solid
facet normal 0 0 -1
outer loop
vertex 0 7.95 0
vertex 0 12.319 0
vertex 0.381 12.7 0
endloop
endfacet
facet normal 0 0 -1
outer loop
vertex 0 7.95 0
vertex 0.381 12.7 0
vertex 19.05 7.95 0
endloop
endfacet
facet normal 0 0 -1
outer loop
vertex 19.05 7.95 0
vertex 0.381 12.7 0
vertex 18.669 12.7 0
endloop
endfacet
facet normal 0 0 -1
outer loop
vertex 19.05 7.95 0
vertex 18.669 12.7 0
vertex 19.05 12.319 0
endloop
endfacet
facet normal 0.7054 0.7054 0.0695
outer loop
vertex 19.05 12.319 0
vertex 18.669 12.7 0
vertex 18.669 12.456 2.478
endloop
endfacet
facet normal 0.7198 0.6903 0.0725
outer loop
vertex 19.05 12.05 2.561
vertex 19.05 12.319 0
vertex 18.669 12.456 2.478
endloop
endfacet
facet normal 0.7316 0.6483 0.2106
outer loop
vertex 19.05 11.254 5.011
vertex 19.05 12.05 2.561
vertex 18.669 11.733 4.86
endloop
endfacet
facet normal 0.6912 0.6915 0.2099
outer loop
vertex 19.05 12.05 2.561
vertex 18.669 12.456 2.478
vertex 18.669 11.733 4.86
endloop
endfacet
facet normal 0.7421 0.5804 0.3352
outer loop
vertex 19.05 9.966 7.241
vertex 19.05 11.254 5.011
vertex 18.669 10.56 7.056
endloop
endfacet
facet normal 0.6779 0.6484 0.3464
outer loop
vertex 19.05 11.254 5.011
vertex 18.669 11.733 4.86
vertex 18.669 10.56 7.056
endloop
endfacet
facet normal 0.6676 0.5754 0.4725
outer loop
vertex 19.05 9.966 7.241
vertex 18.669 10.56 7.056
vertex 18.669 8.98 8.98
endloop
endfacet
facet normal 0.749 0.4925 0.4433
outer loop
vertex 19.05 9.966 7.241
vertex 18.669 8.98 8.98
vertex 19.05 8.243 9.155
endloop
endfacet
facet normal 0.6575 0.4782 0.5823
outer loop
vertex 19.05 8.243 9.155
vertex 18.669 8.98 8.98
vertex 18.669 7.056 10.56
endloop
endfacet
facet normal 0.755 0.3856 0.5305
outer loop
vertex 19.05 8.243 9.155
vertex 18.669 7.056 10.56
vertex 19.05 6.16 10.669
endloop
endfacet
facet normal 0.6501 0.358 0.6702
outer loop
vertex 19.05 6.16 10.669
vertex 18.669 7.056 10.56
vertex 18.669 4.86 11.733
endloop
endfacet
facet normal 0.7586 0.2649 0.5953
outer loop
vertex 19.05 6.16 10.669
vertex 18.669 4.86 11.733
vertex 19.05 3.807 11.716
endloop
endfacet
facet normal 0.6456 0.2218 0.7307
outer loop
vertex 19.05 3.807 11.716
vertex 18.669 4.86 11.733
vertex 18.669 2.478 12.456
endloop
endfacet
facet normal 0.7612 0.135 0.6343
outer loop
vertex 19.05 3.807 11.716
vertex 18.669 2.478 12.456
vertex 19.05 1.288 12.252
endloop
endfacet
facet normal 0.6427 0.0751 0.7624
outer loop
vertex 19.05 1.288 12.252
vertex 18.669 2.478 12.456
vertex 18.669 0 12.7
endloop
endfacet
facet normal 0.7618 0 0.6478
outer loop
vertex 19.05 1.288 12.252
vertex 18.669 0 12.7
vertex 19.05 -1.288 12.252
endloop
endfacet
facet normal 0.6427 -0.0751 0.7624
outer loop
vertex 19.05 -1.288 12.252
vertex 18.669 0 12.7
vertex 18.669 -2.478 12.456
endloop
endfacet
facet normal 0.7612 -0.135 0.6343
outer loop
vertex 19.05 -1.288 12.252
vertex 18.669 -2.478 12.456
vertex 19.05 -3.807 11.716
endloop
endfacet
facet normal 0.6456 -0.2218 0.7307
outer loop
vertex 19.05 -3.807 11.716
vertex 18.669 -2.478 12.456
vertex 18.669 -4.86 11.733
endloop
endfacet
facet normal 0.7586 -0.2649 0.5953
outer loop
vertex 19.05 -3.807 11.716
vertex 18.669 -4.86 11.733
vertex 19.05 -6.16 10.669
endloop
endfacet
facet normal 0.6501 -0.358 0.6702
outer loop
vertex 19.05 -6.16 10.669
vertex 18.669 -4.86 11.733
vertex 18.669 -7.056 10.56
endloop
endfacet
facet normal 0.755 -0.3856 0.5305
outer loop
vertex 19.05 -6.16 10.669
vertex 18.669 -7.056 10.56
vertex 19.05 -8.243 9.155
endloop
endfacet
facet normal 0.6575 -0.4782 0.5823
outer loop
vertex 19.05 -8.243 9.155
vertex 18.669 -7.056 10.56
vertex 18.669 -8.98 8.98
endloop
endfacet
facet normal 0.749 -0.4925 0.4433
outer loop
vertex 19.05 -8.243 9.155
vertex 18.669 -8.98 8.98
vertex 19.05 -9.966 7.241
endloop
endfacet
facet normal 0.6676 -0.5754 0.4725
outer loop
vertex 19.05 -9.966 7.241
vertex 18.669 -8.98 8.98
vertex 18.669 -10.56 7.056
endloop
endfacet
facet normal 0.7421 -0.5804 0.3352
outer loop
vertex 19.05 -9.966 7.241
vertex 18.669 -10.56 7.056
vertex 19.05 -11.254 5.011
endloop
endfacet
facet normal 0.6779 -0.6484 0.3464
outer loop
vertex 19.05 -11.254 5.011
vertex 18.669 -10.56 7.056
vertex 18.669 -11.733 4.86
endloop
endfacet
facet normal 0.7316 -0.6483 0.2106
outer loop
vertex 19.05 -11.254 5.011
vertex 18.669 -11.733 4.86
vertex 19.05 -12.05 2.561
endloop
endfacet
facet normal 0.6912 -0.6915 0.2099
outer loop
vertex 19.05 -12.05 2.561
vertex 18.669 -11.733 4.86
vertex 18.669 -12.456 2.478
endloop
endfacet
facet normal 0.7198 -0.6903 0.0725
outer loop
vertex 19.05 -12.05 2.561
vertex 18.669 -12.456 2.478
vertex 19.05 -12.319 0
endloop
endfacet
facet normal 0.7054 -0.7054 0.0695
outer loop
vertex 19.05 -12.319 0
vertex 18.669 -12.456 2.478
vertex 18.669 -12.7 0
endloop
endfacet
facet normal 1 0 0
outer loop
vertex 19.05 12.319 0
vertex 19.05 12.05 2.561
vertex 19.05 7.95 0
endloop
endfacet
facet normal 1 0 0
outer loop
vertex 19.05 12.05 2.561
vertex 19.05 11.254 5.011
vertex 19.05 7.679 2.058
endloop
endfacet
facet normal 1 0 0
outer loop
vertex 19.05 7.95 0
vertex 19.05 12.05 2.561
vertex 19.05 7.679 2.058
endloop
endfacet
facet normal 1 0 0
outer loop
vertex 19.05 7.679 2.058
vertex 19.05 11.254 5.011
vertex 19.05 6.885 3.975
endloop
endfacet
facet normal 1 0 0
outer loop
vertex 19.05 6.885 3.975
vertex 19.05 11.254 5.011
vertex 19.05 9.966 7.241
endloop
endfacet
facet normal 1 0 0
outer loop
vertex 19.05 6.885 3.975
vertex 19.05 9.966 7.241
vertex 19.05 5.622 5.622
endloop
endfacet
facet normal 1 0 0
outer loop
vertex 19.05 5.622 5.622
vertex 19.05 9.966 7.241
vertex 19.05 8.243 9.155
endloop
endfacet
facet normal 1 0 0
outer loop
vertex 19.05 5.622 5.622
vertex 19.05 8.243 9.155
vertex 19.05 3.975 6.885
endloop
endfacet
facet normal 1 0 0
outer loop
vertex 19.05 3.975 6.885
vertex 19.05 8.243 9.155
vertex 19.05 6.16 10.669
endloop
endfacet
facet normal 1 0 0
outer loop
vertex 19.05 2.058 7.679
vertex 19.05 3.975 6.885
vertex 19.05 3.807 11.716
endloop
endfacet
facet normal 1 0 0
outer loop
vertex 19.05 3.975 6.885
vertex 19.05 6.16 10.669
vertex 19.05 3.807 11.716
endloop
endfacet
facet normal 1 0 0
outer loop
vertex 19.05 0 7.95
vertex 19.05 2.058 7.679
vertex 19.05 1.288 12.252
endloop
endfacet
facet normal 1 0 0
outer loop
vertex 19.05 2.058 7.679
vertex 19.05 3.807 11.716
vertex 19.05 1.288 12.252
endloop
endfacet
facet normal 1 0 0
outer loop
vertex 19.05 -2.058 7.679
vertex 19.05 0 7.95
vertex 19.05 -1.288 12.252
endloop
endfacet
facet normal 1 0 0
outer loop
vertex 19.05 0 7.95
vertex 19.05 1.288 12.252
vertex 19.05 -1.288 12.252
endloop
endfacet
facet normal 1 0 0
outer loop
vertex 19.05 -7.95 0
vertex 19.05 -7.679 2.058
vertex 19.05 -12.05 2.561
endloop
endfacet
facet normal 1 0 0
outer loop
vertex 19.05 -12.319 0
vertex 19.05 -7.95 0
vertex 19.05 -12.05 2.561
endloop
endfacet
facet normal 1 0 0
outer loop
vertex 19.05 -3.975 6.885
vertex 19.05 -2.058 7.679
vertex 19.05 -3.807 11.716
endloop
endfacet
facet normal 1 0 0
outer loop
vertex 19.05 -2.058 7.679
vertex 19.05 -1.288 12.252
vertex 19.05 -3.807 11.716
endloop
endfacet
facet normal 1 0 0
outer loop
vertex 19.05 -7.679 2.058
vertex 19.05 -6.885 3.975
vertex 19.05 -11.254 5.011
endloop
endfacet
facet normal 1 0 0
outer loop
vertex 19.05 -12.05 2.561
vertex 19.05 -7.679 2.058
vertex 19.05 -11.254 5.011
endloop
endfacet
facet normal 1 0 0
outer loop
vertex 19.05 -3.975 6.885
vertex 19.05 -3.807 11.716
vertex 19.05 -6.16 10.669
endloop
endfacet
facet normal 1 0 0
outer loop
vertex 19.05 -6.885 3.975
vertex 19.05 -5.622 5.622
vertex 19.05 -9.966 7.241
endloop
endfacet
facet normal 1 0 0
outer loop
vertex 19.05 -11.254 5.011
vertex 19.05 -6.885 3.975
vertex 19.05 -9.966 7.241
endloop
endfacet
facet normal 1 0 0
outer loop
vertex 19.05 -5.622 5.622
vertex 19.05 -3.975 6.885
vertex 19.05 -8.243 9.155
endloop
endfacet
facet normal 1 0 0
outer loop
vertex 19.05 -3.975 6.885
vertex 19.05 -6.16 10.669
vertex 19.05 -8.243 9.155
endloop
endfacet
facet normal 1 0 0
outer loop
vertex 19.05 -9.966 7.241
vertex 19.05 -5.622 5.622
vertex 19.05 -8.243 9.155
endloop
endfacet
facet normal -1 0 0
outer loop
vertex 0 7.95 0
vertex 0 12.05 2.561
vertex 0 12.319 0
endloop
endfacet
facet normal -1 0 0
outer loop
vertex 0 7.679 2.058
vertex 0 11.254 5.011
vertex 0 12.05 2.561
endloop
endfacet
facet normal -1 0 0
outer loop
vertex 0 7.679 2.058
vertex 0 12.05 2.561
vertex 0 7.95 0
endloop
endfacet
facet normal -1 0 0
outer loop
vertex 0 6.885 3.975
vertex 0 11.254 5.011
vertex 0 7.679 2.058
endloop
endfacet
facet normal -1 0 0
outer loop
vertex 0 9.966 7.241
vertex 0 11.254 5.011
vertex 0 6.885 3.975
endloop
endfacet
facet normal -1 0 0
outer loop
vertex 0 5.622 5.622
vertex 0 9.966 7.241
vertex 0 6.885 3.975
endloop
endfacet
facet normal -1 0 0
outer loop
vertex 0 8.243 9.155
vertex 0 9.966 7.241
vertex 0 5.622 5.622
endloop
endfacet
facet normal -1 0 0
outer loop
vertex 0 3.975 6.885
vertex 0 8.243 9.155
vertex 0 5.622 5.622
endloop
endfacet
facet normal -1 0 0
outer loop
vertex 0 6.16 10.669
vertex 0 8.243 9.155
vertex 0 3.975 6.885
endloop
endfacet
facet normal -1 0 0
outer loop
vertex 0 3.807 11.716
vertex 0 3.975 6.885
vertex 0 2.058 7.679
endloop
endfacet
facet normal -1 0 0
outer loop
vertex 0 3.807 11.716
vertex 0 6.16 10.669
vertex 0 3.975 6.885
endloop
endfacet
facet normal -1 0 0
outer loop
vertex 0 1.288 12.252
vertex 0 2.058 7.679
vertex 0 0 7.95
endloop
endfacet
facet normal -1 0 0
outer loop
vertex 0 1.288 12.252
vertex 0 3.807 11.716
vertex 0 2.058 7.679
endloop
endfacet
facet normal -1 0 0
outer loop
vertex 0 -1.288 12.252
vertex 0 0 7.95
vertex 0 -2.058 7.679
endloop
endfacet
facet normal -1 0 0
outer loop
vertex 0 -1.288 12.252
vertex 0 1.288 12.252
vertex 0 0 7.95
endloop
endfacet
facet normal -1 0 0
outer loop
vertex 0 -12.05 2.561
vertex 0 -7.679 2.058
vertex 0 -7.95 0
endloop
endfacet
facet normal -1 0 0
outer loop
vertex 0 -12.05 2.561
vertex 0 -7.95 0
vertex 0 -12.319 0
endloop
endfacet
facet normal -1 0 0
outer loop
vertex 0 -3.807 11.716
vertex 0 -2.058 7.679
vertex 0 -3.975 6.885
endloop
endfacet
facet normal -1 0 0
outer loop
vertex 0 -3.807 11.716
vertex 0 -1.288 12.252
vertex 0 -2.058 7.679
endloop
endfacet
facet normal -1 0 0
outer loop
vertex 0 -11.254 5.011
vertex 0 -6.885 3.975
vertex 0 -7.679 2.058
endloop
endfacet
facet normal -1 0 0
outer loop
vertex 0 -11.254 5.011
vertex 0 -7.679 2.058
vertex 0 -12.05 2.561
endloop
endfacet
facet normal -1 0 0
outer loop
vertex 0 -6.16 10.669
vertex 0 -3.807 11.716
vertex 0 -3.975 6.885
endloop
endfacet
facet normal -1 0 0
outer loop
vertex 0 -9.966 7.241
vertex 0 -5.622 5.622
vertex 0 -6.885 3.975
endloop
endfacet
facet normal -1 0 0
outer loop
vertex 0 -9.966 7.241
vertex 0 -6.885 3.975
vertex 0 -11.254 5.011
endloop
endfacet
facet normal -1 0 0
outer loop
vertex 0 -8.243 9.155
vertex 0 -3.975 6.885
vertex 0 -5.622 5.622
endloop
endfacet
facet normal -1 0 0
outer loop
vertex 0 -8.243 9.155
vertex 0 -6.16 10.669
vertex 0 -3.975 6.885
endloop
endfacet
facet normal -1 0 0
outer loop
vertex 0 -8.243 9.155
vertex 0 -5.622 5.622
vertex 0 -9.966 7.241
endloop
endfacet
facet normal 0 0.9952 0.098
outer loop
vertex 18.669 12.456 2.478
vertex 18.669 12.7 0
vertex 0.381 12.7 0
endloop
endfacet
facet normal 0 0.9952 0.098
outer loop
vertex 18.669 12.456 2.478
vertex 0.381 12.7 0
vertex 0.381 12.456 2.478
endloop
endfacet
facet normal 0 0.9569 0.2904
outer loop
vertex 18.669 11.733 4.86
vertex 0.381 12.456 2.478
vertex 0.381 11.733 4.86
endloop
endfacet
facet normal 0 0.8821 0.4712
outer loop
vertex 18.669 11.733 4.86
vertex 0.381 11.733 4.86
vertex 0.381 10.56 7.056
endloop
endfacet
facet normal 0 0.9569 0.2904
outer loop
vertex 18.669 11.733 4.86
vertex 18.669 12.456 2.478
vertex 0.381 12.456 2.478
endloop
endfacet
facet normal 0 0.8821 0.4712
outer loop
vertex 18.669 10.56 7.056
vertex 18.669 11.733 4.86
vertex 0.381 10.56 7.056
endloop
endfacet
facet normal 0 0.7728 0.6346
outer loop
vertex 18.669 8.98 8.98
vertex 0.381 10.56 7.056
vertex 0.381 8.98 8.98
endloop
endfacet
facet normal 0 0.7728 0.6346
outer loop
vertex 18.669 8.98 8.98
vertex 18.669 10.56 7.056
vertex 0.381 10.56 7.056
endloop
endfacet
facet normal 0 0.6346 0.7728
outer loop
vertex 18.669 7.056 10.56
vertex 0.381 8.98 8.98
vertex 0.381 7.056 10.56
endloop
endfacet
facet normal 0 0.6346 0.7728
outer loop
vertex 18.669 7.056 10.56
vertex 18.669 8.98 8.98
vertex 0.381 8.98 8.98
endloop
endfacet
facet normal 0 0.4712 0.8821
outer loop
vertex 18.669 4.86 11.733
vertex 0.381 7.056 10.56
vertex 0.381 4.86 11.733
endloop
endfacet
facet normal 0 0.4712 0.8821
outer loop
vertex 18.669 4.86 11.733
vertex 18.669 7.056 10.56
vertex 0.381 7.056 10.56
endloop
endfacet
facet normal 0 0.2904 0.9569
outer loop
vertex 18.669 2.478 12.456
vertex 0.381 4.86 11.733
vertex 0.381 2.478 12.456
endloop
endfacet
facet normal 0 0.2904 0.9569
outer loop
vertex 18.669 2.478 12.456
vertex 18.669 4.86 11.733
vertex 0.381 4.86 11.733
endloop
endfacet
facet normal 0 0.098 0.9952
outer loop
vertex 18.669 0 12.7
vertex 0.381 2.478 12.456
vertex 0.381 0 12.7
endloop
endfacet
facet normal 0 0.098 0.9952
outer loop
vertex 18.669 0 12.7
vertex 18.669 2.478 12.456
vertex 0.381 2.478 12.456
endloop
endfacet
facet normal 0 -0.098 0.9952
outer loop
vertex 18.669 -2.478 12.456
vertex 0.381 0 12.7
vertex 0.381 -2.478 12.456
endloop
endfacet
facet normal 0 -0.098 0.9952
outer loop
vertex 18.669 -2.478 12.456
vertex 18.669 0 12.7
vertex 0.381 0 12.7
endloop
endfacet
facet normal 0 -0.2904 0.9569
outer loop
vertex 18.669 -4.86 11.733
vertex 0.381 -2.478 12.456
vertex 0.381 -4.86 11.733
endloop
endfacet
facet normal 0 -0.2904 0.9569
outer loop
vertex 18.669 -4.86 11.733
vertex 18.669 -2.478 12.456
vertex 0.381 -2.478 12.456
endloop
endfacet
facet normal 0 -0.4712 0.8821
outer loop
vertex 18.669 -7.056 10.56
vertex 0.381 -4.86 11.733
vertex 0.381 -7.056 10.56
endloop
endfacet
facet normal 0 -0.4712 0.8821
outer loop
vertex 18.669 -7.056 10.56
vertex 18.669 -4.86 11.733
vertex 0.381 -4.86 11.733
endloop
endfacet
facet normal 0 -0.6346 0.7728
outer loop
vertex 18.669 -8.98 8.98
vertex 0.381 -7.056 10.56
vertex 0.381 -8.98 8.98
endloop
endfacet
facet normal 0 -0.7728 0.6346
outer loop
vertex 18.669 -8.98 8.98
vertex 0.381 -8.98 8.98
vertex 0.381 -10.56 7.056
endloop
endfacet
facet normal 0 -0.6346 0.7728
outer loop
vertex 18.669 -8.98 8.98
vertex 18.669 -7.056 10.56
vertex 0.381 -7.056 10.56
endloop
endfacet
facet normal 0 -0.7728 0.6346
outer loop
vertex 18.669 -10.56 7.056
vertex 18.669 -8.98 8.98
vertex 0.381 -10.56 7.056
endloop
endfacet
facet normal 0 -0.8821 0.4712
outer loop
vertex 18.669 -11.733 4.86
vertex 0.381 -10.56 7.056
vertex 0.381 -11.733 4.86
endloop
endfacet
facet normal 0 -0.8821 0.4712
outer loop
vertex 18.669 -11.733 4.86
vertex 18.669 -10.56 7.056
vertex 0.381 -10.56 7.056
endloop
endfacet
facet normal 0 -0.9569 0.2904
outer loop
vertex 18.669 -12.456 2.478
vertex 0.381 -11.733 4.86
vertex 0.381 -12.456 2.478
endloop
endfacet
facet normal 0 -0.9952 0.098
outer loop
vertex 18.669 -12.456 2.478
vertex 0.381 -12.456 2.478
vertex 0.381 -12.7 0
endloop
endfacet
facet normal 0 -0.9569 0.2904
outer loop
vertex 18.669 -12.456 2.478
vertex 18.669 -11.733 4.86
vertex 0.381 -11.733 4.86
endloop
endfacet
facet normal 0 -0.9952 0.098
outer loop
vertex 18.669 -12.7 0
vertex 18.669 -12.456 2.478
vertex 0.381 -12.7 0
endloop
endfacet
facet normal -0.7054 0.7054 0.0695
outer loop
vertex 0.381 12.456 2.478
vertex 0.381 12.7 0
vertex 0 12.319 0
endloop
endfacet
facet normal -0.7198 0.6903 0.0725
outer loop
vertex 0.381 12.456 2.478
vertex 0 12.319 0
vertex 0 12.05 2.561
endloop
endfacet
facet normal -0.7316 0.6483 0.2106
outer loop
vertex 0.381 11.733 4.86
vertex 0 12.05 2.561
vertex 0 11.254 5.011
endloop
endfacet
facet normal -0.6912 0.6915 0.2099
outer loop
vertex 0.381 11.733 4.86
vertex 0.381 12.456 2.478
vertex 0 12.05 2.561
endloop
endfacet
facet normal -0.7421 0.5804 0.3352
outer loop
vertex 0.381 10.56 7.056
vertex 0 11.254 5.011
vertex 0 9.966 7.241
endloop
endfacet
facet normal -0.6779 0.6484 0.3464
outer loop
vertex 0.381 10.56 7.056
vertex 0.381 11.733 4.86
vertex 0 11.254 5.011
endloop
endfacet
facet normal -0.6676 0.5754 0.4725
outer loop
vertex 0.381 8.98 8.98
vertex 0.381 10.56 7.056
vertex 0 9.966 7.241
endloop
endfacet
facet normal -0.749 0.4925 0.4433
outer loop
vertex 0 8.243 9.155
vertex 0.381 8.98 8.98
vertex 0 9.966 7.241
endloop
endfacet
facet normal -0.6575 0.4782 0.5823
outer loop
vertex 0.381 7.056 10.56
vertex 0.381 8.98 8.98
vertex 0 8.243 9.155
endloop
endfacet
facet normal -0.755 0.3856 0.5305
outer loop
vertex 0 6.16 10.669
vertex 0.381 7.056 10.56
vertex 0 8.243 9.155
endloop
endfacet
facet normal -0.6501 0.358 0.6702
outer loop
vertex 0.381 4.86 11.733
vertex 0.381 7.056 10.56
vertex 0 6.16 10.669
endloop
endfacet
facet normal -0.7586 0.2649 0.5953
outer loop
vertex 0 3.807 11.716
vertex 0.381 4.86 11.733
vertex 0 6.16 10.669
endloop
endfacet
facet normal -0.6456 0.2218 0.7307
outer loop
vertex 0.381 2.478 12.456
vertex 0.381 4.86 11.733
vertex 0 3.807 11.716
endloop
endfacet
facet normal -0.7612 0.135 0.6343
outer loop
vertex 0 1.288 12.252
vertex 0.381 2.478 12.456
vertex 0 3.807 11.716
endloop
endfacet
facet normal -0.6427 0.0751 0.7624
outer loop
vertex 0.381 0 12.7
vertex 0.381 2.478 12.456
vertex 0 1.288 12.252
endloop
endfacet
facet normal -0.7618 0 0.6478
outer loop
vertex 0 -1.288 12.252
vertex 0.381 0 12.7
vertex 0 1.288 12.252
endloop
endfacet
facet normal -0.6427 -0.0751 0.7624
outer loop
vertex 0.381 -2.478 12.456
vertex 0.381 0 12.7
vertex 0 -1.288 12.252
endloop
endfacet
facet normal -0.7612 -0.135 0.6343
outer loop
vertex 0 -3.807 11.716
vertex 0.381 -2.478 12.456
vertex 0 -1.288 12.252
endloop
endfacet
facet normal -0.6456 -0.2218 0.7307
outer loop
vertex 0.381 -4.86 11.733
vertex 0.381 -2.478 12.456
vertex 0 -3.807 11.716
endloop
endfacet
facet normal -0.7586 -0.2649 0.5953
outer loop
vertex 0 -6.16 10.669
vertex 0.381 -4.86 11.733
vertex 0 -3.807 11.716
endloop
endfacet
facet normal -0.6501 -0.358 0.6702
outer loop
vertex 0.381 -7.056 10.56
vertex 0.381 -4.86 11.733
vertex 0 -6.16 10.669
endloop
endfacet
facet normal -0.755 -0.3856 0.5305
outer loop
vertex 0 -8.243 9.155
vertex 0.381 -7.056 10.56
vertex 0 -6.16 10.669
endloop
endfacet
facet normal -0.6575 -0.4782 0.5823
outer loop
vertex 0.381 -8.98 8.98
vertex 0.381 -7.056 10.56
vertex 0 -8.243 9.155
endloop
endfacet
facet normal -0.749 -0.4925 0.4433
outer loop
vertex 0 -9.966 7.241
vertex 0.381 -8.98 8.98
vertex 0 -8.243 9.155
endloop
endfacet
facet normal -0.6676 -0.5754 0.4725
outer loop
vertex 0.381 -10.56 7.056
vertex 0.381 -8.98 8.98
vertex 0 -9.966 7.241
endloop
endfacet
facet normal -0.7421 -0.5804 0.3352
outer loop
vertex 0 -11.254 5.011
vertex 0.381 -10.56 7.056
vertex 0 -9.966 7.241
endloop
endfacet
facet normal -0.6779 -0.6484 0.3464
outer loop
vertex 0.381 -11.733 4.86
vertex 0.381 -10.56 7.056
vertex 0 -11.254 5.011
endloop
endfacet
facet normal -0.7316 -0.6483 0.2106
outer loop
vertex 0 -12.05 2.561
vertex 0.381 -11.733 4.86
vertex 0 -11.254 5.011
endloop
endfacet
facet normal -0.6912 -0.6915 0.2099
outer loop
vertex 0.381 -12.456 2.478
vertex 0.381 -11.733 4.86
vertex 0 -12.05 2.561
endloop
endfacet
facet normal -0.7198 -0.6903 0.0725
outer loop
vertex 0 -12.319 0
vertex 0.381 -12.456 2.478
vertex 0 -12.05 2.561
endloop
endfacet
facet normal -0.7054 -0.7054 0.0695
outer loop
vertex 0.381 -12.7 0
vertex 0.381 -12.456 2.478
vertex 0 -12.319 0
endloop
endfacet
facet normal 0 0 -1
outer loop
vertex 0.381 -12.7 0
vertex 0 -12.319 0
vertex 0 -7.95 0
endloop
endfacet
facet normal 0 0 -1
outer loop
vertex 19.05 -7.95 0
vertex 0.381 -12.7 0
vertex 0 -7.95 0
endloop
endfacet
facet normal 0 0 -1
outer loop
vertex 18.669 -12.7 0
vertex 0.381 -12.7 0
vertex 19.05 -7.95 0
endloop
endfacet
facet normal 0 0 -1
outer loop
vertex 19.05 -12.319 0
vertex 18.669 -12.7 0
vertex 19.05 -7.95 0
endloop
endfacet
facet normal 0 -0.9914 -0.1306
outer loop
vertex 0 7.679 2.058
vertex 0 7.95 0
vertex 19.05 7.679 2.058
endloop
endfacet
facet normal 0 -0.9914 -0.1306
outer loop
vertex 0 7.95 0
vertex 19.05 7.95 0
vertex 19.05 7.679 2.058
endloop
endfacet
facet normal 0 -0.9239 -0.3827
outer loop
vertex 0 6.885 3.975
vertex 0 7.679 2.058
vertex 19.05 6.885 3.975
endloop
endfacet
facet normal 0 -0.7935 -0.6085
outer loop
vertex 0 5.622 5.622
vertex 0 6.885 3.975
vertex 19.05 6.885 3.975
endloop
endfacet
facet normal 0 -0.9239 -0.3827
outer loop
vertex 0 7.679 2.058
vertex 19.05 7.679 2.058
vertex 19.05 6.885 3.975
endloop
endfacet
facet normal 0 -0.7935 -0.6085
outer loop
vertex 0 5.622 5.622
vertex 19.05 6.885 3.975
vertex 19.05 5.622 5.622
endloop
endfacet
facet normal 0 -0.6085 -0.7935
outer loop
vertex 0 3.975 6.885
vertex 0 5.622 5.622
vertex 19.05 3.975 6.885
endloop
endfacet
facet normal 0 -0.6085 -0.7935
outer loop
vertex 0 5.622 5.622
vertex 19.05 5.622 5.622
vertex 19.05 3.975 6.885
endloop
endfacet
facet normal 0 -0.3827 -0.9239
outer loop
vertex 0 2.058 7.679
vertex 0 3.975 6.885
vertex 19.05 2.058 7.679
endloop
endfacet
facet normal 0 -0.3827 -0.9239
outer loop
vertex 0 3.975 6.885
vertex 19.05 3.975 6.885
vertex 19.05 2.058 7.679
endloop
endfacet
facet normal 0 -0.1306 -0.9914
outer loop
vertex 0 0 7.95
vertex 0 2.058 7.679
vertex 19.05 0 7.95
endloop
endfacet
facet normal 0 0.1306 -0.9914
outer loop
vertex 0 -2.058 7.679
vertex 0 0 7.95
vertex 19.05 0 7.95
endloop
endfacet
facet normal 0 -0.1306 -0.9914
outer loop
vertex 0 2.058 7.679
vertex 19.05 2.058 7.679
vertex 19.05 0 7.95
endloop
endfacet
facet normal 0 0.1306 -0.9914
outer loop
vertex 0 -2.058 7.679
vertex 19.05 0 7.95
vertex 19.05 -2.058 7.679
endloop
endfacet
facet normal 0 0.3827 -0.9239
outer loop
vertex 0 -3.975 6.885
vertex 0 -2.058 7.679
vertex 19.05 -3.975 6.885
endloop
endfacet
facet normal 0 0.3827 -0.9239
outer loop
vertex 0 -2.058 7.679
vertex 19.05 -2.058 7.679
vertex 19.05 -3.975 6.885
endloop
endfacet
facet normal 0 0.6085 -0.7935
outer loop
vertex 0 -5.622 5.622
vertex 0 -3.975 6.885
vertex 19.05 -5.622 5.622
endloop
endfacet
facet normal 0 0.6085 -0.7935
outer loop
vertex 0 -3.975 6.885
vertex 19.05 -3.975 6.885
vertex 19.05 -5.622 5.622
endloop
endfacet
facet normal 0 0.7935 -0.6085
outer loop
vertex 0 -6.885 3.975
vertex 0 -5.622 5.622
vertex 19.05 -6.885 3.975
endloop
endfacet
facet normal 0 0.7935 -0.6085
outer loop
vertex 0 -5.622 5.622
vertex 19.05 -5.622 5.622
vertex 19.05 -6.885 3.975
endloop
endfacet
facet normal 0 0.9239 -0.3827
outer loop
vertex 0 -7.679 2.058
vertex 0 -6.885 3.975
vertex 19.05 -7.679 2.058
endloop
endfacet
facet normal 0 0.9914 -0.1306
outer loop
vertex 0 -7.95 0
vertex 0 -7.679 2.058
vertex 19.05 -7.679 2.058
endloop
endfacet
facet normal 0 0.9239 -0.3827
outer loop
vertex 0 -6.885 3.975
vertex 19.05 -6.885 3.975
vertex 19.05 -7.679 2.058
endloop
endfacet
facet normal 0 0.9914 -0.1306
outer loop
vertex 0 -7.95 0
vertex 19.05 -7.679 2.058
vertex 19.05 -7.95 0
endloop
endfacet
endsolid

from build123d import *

# Parameters (mm, degrees)
PRIMARY_SKETCH_W      = 19.05
PRIMARY_SKETCH_H      = 4.7498
PRIMARY_REVOLVE_ANGLE = 180
EDGE_CHAMFER_SIZE     = 0.381


with BuildPart() as part:
    # Primary Sketch → Primary Revolve (revolve)
    with BuildSketch(Plane.XY):
        with Locations((9.525, 10.3251)):
            Rectangle(PRIMARY_SKETCH_W, PRIMARY_SKETCH_H)
    revolve(axis=Axis((0, 0, 0), (1, 0, 0)), revolution_arc=PRIMARY_REVOLVE_ANGLE)

    # Edge Chamfer
    edge_chamfer_edges = [part.edges().sort_by_distance(p)[0] for p in [
        (19.05, 0, 12.7),
        (0, 0, 12.7),
    ]]
    chamfer(edge_chamfer_edges, length=EDGE_CHAMFER_SIZE)


solid = part.part
